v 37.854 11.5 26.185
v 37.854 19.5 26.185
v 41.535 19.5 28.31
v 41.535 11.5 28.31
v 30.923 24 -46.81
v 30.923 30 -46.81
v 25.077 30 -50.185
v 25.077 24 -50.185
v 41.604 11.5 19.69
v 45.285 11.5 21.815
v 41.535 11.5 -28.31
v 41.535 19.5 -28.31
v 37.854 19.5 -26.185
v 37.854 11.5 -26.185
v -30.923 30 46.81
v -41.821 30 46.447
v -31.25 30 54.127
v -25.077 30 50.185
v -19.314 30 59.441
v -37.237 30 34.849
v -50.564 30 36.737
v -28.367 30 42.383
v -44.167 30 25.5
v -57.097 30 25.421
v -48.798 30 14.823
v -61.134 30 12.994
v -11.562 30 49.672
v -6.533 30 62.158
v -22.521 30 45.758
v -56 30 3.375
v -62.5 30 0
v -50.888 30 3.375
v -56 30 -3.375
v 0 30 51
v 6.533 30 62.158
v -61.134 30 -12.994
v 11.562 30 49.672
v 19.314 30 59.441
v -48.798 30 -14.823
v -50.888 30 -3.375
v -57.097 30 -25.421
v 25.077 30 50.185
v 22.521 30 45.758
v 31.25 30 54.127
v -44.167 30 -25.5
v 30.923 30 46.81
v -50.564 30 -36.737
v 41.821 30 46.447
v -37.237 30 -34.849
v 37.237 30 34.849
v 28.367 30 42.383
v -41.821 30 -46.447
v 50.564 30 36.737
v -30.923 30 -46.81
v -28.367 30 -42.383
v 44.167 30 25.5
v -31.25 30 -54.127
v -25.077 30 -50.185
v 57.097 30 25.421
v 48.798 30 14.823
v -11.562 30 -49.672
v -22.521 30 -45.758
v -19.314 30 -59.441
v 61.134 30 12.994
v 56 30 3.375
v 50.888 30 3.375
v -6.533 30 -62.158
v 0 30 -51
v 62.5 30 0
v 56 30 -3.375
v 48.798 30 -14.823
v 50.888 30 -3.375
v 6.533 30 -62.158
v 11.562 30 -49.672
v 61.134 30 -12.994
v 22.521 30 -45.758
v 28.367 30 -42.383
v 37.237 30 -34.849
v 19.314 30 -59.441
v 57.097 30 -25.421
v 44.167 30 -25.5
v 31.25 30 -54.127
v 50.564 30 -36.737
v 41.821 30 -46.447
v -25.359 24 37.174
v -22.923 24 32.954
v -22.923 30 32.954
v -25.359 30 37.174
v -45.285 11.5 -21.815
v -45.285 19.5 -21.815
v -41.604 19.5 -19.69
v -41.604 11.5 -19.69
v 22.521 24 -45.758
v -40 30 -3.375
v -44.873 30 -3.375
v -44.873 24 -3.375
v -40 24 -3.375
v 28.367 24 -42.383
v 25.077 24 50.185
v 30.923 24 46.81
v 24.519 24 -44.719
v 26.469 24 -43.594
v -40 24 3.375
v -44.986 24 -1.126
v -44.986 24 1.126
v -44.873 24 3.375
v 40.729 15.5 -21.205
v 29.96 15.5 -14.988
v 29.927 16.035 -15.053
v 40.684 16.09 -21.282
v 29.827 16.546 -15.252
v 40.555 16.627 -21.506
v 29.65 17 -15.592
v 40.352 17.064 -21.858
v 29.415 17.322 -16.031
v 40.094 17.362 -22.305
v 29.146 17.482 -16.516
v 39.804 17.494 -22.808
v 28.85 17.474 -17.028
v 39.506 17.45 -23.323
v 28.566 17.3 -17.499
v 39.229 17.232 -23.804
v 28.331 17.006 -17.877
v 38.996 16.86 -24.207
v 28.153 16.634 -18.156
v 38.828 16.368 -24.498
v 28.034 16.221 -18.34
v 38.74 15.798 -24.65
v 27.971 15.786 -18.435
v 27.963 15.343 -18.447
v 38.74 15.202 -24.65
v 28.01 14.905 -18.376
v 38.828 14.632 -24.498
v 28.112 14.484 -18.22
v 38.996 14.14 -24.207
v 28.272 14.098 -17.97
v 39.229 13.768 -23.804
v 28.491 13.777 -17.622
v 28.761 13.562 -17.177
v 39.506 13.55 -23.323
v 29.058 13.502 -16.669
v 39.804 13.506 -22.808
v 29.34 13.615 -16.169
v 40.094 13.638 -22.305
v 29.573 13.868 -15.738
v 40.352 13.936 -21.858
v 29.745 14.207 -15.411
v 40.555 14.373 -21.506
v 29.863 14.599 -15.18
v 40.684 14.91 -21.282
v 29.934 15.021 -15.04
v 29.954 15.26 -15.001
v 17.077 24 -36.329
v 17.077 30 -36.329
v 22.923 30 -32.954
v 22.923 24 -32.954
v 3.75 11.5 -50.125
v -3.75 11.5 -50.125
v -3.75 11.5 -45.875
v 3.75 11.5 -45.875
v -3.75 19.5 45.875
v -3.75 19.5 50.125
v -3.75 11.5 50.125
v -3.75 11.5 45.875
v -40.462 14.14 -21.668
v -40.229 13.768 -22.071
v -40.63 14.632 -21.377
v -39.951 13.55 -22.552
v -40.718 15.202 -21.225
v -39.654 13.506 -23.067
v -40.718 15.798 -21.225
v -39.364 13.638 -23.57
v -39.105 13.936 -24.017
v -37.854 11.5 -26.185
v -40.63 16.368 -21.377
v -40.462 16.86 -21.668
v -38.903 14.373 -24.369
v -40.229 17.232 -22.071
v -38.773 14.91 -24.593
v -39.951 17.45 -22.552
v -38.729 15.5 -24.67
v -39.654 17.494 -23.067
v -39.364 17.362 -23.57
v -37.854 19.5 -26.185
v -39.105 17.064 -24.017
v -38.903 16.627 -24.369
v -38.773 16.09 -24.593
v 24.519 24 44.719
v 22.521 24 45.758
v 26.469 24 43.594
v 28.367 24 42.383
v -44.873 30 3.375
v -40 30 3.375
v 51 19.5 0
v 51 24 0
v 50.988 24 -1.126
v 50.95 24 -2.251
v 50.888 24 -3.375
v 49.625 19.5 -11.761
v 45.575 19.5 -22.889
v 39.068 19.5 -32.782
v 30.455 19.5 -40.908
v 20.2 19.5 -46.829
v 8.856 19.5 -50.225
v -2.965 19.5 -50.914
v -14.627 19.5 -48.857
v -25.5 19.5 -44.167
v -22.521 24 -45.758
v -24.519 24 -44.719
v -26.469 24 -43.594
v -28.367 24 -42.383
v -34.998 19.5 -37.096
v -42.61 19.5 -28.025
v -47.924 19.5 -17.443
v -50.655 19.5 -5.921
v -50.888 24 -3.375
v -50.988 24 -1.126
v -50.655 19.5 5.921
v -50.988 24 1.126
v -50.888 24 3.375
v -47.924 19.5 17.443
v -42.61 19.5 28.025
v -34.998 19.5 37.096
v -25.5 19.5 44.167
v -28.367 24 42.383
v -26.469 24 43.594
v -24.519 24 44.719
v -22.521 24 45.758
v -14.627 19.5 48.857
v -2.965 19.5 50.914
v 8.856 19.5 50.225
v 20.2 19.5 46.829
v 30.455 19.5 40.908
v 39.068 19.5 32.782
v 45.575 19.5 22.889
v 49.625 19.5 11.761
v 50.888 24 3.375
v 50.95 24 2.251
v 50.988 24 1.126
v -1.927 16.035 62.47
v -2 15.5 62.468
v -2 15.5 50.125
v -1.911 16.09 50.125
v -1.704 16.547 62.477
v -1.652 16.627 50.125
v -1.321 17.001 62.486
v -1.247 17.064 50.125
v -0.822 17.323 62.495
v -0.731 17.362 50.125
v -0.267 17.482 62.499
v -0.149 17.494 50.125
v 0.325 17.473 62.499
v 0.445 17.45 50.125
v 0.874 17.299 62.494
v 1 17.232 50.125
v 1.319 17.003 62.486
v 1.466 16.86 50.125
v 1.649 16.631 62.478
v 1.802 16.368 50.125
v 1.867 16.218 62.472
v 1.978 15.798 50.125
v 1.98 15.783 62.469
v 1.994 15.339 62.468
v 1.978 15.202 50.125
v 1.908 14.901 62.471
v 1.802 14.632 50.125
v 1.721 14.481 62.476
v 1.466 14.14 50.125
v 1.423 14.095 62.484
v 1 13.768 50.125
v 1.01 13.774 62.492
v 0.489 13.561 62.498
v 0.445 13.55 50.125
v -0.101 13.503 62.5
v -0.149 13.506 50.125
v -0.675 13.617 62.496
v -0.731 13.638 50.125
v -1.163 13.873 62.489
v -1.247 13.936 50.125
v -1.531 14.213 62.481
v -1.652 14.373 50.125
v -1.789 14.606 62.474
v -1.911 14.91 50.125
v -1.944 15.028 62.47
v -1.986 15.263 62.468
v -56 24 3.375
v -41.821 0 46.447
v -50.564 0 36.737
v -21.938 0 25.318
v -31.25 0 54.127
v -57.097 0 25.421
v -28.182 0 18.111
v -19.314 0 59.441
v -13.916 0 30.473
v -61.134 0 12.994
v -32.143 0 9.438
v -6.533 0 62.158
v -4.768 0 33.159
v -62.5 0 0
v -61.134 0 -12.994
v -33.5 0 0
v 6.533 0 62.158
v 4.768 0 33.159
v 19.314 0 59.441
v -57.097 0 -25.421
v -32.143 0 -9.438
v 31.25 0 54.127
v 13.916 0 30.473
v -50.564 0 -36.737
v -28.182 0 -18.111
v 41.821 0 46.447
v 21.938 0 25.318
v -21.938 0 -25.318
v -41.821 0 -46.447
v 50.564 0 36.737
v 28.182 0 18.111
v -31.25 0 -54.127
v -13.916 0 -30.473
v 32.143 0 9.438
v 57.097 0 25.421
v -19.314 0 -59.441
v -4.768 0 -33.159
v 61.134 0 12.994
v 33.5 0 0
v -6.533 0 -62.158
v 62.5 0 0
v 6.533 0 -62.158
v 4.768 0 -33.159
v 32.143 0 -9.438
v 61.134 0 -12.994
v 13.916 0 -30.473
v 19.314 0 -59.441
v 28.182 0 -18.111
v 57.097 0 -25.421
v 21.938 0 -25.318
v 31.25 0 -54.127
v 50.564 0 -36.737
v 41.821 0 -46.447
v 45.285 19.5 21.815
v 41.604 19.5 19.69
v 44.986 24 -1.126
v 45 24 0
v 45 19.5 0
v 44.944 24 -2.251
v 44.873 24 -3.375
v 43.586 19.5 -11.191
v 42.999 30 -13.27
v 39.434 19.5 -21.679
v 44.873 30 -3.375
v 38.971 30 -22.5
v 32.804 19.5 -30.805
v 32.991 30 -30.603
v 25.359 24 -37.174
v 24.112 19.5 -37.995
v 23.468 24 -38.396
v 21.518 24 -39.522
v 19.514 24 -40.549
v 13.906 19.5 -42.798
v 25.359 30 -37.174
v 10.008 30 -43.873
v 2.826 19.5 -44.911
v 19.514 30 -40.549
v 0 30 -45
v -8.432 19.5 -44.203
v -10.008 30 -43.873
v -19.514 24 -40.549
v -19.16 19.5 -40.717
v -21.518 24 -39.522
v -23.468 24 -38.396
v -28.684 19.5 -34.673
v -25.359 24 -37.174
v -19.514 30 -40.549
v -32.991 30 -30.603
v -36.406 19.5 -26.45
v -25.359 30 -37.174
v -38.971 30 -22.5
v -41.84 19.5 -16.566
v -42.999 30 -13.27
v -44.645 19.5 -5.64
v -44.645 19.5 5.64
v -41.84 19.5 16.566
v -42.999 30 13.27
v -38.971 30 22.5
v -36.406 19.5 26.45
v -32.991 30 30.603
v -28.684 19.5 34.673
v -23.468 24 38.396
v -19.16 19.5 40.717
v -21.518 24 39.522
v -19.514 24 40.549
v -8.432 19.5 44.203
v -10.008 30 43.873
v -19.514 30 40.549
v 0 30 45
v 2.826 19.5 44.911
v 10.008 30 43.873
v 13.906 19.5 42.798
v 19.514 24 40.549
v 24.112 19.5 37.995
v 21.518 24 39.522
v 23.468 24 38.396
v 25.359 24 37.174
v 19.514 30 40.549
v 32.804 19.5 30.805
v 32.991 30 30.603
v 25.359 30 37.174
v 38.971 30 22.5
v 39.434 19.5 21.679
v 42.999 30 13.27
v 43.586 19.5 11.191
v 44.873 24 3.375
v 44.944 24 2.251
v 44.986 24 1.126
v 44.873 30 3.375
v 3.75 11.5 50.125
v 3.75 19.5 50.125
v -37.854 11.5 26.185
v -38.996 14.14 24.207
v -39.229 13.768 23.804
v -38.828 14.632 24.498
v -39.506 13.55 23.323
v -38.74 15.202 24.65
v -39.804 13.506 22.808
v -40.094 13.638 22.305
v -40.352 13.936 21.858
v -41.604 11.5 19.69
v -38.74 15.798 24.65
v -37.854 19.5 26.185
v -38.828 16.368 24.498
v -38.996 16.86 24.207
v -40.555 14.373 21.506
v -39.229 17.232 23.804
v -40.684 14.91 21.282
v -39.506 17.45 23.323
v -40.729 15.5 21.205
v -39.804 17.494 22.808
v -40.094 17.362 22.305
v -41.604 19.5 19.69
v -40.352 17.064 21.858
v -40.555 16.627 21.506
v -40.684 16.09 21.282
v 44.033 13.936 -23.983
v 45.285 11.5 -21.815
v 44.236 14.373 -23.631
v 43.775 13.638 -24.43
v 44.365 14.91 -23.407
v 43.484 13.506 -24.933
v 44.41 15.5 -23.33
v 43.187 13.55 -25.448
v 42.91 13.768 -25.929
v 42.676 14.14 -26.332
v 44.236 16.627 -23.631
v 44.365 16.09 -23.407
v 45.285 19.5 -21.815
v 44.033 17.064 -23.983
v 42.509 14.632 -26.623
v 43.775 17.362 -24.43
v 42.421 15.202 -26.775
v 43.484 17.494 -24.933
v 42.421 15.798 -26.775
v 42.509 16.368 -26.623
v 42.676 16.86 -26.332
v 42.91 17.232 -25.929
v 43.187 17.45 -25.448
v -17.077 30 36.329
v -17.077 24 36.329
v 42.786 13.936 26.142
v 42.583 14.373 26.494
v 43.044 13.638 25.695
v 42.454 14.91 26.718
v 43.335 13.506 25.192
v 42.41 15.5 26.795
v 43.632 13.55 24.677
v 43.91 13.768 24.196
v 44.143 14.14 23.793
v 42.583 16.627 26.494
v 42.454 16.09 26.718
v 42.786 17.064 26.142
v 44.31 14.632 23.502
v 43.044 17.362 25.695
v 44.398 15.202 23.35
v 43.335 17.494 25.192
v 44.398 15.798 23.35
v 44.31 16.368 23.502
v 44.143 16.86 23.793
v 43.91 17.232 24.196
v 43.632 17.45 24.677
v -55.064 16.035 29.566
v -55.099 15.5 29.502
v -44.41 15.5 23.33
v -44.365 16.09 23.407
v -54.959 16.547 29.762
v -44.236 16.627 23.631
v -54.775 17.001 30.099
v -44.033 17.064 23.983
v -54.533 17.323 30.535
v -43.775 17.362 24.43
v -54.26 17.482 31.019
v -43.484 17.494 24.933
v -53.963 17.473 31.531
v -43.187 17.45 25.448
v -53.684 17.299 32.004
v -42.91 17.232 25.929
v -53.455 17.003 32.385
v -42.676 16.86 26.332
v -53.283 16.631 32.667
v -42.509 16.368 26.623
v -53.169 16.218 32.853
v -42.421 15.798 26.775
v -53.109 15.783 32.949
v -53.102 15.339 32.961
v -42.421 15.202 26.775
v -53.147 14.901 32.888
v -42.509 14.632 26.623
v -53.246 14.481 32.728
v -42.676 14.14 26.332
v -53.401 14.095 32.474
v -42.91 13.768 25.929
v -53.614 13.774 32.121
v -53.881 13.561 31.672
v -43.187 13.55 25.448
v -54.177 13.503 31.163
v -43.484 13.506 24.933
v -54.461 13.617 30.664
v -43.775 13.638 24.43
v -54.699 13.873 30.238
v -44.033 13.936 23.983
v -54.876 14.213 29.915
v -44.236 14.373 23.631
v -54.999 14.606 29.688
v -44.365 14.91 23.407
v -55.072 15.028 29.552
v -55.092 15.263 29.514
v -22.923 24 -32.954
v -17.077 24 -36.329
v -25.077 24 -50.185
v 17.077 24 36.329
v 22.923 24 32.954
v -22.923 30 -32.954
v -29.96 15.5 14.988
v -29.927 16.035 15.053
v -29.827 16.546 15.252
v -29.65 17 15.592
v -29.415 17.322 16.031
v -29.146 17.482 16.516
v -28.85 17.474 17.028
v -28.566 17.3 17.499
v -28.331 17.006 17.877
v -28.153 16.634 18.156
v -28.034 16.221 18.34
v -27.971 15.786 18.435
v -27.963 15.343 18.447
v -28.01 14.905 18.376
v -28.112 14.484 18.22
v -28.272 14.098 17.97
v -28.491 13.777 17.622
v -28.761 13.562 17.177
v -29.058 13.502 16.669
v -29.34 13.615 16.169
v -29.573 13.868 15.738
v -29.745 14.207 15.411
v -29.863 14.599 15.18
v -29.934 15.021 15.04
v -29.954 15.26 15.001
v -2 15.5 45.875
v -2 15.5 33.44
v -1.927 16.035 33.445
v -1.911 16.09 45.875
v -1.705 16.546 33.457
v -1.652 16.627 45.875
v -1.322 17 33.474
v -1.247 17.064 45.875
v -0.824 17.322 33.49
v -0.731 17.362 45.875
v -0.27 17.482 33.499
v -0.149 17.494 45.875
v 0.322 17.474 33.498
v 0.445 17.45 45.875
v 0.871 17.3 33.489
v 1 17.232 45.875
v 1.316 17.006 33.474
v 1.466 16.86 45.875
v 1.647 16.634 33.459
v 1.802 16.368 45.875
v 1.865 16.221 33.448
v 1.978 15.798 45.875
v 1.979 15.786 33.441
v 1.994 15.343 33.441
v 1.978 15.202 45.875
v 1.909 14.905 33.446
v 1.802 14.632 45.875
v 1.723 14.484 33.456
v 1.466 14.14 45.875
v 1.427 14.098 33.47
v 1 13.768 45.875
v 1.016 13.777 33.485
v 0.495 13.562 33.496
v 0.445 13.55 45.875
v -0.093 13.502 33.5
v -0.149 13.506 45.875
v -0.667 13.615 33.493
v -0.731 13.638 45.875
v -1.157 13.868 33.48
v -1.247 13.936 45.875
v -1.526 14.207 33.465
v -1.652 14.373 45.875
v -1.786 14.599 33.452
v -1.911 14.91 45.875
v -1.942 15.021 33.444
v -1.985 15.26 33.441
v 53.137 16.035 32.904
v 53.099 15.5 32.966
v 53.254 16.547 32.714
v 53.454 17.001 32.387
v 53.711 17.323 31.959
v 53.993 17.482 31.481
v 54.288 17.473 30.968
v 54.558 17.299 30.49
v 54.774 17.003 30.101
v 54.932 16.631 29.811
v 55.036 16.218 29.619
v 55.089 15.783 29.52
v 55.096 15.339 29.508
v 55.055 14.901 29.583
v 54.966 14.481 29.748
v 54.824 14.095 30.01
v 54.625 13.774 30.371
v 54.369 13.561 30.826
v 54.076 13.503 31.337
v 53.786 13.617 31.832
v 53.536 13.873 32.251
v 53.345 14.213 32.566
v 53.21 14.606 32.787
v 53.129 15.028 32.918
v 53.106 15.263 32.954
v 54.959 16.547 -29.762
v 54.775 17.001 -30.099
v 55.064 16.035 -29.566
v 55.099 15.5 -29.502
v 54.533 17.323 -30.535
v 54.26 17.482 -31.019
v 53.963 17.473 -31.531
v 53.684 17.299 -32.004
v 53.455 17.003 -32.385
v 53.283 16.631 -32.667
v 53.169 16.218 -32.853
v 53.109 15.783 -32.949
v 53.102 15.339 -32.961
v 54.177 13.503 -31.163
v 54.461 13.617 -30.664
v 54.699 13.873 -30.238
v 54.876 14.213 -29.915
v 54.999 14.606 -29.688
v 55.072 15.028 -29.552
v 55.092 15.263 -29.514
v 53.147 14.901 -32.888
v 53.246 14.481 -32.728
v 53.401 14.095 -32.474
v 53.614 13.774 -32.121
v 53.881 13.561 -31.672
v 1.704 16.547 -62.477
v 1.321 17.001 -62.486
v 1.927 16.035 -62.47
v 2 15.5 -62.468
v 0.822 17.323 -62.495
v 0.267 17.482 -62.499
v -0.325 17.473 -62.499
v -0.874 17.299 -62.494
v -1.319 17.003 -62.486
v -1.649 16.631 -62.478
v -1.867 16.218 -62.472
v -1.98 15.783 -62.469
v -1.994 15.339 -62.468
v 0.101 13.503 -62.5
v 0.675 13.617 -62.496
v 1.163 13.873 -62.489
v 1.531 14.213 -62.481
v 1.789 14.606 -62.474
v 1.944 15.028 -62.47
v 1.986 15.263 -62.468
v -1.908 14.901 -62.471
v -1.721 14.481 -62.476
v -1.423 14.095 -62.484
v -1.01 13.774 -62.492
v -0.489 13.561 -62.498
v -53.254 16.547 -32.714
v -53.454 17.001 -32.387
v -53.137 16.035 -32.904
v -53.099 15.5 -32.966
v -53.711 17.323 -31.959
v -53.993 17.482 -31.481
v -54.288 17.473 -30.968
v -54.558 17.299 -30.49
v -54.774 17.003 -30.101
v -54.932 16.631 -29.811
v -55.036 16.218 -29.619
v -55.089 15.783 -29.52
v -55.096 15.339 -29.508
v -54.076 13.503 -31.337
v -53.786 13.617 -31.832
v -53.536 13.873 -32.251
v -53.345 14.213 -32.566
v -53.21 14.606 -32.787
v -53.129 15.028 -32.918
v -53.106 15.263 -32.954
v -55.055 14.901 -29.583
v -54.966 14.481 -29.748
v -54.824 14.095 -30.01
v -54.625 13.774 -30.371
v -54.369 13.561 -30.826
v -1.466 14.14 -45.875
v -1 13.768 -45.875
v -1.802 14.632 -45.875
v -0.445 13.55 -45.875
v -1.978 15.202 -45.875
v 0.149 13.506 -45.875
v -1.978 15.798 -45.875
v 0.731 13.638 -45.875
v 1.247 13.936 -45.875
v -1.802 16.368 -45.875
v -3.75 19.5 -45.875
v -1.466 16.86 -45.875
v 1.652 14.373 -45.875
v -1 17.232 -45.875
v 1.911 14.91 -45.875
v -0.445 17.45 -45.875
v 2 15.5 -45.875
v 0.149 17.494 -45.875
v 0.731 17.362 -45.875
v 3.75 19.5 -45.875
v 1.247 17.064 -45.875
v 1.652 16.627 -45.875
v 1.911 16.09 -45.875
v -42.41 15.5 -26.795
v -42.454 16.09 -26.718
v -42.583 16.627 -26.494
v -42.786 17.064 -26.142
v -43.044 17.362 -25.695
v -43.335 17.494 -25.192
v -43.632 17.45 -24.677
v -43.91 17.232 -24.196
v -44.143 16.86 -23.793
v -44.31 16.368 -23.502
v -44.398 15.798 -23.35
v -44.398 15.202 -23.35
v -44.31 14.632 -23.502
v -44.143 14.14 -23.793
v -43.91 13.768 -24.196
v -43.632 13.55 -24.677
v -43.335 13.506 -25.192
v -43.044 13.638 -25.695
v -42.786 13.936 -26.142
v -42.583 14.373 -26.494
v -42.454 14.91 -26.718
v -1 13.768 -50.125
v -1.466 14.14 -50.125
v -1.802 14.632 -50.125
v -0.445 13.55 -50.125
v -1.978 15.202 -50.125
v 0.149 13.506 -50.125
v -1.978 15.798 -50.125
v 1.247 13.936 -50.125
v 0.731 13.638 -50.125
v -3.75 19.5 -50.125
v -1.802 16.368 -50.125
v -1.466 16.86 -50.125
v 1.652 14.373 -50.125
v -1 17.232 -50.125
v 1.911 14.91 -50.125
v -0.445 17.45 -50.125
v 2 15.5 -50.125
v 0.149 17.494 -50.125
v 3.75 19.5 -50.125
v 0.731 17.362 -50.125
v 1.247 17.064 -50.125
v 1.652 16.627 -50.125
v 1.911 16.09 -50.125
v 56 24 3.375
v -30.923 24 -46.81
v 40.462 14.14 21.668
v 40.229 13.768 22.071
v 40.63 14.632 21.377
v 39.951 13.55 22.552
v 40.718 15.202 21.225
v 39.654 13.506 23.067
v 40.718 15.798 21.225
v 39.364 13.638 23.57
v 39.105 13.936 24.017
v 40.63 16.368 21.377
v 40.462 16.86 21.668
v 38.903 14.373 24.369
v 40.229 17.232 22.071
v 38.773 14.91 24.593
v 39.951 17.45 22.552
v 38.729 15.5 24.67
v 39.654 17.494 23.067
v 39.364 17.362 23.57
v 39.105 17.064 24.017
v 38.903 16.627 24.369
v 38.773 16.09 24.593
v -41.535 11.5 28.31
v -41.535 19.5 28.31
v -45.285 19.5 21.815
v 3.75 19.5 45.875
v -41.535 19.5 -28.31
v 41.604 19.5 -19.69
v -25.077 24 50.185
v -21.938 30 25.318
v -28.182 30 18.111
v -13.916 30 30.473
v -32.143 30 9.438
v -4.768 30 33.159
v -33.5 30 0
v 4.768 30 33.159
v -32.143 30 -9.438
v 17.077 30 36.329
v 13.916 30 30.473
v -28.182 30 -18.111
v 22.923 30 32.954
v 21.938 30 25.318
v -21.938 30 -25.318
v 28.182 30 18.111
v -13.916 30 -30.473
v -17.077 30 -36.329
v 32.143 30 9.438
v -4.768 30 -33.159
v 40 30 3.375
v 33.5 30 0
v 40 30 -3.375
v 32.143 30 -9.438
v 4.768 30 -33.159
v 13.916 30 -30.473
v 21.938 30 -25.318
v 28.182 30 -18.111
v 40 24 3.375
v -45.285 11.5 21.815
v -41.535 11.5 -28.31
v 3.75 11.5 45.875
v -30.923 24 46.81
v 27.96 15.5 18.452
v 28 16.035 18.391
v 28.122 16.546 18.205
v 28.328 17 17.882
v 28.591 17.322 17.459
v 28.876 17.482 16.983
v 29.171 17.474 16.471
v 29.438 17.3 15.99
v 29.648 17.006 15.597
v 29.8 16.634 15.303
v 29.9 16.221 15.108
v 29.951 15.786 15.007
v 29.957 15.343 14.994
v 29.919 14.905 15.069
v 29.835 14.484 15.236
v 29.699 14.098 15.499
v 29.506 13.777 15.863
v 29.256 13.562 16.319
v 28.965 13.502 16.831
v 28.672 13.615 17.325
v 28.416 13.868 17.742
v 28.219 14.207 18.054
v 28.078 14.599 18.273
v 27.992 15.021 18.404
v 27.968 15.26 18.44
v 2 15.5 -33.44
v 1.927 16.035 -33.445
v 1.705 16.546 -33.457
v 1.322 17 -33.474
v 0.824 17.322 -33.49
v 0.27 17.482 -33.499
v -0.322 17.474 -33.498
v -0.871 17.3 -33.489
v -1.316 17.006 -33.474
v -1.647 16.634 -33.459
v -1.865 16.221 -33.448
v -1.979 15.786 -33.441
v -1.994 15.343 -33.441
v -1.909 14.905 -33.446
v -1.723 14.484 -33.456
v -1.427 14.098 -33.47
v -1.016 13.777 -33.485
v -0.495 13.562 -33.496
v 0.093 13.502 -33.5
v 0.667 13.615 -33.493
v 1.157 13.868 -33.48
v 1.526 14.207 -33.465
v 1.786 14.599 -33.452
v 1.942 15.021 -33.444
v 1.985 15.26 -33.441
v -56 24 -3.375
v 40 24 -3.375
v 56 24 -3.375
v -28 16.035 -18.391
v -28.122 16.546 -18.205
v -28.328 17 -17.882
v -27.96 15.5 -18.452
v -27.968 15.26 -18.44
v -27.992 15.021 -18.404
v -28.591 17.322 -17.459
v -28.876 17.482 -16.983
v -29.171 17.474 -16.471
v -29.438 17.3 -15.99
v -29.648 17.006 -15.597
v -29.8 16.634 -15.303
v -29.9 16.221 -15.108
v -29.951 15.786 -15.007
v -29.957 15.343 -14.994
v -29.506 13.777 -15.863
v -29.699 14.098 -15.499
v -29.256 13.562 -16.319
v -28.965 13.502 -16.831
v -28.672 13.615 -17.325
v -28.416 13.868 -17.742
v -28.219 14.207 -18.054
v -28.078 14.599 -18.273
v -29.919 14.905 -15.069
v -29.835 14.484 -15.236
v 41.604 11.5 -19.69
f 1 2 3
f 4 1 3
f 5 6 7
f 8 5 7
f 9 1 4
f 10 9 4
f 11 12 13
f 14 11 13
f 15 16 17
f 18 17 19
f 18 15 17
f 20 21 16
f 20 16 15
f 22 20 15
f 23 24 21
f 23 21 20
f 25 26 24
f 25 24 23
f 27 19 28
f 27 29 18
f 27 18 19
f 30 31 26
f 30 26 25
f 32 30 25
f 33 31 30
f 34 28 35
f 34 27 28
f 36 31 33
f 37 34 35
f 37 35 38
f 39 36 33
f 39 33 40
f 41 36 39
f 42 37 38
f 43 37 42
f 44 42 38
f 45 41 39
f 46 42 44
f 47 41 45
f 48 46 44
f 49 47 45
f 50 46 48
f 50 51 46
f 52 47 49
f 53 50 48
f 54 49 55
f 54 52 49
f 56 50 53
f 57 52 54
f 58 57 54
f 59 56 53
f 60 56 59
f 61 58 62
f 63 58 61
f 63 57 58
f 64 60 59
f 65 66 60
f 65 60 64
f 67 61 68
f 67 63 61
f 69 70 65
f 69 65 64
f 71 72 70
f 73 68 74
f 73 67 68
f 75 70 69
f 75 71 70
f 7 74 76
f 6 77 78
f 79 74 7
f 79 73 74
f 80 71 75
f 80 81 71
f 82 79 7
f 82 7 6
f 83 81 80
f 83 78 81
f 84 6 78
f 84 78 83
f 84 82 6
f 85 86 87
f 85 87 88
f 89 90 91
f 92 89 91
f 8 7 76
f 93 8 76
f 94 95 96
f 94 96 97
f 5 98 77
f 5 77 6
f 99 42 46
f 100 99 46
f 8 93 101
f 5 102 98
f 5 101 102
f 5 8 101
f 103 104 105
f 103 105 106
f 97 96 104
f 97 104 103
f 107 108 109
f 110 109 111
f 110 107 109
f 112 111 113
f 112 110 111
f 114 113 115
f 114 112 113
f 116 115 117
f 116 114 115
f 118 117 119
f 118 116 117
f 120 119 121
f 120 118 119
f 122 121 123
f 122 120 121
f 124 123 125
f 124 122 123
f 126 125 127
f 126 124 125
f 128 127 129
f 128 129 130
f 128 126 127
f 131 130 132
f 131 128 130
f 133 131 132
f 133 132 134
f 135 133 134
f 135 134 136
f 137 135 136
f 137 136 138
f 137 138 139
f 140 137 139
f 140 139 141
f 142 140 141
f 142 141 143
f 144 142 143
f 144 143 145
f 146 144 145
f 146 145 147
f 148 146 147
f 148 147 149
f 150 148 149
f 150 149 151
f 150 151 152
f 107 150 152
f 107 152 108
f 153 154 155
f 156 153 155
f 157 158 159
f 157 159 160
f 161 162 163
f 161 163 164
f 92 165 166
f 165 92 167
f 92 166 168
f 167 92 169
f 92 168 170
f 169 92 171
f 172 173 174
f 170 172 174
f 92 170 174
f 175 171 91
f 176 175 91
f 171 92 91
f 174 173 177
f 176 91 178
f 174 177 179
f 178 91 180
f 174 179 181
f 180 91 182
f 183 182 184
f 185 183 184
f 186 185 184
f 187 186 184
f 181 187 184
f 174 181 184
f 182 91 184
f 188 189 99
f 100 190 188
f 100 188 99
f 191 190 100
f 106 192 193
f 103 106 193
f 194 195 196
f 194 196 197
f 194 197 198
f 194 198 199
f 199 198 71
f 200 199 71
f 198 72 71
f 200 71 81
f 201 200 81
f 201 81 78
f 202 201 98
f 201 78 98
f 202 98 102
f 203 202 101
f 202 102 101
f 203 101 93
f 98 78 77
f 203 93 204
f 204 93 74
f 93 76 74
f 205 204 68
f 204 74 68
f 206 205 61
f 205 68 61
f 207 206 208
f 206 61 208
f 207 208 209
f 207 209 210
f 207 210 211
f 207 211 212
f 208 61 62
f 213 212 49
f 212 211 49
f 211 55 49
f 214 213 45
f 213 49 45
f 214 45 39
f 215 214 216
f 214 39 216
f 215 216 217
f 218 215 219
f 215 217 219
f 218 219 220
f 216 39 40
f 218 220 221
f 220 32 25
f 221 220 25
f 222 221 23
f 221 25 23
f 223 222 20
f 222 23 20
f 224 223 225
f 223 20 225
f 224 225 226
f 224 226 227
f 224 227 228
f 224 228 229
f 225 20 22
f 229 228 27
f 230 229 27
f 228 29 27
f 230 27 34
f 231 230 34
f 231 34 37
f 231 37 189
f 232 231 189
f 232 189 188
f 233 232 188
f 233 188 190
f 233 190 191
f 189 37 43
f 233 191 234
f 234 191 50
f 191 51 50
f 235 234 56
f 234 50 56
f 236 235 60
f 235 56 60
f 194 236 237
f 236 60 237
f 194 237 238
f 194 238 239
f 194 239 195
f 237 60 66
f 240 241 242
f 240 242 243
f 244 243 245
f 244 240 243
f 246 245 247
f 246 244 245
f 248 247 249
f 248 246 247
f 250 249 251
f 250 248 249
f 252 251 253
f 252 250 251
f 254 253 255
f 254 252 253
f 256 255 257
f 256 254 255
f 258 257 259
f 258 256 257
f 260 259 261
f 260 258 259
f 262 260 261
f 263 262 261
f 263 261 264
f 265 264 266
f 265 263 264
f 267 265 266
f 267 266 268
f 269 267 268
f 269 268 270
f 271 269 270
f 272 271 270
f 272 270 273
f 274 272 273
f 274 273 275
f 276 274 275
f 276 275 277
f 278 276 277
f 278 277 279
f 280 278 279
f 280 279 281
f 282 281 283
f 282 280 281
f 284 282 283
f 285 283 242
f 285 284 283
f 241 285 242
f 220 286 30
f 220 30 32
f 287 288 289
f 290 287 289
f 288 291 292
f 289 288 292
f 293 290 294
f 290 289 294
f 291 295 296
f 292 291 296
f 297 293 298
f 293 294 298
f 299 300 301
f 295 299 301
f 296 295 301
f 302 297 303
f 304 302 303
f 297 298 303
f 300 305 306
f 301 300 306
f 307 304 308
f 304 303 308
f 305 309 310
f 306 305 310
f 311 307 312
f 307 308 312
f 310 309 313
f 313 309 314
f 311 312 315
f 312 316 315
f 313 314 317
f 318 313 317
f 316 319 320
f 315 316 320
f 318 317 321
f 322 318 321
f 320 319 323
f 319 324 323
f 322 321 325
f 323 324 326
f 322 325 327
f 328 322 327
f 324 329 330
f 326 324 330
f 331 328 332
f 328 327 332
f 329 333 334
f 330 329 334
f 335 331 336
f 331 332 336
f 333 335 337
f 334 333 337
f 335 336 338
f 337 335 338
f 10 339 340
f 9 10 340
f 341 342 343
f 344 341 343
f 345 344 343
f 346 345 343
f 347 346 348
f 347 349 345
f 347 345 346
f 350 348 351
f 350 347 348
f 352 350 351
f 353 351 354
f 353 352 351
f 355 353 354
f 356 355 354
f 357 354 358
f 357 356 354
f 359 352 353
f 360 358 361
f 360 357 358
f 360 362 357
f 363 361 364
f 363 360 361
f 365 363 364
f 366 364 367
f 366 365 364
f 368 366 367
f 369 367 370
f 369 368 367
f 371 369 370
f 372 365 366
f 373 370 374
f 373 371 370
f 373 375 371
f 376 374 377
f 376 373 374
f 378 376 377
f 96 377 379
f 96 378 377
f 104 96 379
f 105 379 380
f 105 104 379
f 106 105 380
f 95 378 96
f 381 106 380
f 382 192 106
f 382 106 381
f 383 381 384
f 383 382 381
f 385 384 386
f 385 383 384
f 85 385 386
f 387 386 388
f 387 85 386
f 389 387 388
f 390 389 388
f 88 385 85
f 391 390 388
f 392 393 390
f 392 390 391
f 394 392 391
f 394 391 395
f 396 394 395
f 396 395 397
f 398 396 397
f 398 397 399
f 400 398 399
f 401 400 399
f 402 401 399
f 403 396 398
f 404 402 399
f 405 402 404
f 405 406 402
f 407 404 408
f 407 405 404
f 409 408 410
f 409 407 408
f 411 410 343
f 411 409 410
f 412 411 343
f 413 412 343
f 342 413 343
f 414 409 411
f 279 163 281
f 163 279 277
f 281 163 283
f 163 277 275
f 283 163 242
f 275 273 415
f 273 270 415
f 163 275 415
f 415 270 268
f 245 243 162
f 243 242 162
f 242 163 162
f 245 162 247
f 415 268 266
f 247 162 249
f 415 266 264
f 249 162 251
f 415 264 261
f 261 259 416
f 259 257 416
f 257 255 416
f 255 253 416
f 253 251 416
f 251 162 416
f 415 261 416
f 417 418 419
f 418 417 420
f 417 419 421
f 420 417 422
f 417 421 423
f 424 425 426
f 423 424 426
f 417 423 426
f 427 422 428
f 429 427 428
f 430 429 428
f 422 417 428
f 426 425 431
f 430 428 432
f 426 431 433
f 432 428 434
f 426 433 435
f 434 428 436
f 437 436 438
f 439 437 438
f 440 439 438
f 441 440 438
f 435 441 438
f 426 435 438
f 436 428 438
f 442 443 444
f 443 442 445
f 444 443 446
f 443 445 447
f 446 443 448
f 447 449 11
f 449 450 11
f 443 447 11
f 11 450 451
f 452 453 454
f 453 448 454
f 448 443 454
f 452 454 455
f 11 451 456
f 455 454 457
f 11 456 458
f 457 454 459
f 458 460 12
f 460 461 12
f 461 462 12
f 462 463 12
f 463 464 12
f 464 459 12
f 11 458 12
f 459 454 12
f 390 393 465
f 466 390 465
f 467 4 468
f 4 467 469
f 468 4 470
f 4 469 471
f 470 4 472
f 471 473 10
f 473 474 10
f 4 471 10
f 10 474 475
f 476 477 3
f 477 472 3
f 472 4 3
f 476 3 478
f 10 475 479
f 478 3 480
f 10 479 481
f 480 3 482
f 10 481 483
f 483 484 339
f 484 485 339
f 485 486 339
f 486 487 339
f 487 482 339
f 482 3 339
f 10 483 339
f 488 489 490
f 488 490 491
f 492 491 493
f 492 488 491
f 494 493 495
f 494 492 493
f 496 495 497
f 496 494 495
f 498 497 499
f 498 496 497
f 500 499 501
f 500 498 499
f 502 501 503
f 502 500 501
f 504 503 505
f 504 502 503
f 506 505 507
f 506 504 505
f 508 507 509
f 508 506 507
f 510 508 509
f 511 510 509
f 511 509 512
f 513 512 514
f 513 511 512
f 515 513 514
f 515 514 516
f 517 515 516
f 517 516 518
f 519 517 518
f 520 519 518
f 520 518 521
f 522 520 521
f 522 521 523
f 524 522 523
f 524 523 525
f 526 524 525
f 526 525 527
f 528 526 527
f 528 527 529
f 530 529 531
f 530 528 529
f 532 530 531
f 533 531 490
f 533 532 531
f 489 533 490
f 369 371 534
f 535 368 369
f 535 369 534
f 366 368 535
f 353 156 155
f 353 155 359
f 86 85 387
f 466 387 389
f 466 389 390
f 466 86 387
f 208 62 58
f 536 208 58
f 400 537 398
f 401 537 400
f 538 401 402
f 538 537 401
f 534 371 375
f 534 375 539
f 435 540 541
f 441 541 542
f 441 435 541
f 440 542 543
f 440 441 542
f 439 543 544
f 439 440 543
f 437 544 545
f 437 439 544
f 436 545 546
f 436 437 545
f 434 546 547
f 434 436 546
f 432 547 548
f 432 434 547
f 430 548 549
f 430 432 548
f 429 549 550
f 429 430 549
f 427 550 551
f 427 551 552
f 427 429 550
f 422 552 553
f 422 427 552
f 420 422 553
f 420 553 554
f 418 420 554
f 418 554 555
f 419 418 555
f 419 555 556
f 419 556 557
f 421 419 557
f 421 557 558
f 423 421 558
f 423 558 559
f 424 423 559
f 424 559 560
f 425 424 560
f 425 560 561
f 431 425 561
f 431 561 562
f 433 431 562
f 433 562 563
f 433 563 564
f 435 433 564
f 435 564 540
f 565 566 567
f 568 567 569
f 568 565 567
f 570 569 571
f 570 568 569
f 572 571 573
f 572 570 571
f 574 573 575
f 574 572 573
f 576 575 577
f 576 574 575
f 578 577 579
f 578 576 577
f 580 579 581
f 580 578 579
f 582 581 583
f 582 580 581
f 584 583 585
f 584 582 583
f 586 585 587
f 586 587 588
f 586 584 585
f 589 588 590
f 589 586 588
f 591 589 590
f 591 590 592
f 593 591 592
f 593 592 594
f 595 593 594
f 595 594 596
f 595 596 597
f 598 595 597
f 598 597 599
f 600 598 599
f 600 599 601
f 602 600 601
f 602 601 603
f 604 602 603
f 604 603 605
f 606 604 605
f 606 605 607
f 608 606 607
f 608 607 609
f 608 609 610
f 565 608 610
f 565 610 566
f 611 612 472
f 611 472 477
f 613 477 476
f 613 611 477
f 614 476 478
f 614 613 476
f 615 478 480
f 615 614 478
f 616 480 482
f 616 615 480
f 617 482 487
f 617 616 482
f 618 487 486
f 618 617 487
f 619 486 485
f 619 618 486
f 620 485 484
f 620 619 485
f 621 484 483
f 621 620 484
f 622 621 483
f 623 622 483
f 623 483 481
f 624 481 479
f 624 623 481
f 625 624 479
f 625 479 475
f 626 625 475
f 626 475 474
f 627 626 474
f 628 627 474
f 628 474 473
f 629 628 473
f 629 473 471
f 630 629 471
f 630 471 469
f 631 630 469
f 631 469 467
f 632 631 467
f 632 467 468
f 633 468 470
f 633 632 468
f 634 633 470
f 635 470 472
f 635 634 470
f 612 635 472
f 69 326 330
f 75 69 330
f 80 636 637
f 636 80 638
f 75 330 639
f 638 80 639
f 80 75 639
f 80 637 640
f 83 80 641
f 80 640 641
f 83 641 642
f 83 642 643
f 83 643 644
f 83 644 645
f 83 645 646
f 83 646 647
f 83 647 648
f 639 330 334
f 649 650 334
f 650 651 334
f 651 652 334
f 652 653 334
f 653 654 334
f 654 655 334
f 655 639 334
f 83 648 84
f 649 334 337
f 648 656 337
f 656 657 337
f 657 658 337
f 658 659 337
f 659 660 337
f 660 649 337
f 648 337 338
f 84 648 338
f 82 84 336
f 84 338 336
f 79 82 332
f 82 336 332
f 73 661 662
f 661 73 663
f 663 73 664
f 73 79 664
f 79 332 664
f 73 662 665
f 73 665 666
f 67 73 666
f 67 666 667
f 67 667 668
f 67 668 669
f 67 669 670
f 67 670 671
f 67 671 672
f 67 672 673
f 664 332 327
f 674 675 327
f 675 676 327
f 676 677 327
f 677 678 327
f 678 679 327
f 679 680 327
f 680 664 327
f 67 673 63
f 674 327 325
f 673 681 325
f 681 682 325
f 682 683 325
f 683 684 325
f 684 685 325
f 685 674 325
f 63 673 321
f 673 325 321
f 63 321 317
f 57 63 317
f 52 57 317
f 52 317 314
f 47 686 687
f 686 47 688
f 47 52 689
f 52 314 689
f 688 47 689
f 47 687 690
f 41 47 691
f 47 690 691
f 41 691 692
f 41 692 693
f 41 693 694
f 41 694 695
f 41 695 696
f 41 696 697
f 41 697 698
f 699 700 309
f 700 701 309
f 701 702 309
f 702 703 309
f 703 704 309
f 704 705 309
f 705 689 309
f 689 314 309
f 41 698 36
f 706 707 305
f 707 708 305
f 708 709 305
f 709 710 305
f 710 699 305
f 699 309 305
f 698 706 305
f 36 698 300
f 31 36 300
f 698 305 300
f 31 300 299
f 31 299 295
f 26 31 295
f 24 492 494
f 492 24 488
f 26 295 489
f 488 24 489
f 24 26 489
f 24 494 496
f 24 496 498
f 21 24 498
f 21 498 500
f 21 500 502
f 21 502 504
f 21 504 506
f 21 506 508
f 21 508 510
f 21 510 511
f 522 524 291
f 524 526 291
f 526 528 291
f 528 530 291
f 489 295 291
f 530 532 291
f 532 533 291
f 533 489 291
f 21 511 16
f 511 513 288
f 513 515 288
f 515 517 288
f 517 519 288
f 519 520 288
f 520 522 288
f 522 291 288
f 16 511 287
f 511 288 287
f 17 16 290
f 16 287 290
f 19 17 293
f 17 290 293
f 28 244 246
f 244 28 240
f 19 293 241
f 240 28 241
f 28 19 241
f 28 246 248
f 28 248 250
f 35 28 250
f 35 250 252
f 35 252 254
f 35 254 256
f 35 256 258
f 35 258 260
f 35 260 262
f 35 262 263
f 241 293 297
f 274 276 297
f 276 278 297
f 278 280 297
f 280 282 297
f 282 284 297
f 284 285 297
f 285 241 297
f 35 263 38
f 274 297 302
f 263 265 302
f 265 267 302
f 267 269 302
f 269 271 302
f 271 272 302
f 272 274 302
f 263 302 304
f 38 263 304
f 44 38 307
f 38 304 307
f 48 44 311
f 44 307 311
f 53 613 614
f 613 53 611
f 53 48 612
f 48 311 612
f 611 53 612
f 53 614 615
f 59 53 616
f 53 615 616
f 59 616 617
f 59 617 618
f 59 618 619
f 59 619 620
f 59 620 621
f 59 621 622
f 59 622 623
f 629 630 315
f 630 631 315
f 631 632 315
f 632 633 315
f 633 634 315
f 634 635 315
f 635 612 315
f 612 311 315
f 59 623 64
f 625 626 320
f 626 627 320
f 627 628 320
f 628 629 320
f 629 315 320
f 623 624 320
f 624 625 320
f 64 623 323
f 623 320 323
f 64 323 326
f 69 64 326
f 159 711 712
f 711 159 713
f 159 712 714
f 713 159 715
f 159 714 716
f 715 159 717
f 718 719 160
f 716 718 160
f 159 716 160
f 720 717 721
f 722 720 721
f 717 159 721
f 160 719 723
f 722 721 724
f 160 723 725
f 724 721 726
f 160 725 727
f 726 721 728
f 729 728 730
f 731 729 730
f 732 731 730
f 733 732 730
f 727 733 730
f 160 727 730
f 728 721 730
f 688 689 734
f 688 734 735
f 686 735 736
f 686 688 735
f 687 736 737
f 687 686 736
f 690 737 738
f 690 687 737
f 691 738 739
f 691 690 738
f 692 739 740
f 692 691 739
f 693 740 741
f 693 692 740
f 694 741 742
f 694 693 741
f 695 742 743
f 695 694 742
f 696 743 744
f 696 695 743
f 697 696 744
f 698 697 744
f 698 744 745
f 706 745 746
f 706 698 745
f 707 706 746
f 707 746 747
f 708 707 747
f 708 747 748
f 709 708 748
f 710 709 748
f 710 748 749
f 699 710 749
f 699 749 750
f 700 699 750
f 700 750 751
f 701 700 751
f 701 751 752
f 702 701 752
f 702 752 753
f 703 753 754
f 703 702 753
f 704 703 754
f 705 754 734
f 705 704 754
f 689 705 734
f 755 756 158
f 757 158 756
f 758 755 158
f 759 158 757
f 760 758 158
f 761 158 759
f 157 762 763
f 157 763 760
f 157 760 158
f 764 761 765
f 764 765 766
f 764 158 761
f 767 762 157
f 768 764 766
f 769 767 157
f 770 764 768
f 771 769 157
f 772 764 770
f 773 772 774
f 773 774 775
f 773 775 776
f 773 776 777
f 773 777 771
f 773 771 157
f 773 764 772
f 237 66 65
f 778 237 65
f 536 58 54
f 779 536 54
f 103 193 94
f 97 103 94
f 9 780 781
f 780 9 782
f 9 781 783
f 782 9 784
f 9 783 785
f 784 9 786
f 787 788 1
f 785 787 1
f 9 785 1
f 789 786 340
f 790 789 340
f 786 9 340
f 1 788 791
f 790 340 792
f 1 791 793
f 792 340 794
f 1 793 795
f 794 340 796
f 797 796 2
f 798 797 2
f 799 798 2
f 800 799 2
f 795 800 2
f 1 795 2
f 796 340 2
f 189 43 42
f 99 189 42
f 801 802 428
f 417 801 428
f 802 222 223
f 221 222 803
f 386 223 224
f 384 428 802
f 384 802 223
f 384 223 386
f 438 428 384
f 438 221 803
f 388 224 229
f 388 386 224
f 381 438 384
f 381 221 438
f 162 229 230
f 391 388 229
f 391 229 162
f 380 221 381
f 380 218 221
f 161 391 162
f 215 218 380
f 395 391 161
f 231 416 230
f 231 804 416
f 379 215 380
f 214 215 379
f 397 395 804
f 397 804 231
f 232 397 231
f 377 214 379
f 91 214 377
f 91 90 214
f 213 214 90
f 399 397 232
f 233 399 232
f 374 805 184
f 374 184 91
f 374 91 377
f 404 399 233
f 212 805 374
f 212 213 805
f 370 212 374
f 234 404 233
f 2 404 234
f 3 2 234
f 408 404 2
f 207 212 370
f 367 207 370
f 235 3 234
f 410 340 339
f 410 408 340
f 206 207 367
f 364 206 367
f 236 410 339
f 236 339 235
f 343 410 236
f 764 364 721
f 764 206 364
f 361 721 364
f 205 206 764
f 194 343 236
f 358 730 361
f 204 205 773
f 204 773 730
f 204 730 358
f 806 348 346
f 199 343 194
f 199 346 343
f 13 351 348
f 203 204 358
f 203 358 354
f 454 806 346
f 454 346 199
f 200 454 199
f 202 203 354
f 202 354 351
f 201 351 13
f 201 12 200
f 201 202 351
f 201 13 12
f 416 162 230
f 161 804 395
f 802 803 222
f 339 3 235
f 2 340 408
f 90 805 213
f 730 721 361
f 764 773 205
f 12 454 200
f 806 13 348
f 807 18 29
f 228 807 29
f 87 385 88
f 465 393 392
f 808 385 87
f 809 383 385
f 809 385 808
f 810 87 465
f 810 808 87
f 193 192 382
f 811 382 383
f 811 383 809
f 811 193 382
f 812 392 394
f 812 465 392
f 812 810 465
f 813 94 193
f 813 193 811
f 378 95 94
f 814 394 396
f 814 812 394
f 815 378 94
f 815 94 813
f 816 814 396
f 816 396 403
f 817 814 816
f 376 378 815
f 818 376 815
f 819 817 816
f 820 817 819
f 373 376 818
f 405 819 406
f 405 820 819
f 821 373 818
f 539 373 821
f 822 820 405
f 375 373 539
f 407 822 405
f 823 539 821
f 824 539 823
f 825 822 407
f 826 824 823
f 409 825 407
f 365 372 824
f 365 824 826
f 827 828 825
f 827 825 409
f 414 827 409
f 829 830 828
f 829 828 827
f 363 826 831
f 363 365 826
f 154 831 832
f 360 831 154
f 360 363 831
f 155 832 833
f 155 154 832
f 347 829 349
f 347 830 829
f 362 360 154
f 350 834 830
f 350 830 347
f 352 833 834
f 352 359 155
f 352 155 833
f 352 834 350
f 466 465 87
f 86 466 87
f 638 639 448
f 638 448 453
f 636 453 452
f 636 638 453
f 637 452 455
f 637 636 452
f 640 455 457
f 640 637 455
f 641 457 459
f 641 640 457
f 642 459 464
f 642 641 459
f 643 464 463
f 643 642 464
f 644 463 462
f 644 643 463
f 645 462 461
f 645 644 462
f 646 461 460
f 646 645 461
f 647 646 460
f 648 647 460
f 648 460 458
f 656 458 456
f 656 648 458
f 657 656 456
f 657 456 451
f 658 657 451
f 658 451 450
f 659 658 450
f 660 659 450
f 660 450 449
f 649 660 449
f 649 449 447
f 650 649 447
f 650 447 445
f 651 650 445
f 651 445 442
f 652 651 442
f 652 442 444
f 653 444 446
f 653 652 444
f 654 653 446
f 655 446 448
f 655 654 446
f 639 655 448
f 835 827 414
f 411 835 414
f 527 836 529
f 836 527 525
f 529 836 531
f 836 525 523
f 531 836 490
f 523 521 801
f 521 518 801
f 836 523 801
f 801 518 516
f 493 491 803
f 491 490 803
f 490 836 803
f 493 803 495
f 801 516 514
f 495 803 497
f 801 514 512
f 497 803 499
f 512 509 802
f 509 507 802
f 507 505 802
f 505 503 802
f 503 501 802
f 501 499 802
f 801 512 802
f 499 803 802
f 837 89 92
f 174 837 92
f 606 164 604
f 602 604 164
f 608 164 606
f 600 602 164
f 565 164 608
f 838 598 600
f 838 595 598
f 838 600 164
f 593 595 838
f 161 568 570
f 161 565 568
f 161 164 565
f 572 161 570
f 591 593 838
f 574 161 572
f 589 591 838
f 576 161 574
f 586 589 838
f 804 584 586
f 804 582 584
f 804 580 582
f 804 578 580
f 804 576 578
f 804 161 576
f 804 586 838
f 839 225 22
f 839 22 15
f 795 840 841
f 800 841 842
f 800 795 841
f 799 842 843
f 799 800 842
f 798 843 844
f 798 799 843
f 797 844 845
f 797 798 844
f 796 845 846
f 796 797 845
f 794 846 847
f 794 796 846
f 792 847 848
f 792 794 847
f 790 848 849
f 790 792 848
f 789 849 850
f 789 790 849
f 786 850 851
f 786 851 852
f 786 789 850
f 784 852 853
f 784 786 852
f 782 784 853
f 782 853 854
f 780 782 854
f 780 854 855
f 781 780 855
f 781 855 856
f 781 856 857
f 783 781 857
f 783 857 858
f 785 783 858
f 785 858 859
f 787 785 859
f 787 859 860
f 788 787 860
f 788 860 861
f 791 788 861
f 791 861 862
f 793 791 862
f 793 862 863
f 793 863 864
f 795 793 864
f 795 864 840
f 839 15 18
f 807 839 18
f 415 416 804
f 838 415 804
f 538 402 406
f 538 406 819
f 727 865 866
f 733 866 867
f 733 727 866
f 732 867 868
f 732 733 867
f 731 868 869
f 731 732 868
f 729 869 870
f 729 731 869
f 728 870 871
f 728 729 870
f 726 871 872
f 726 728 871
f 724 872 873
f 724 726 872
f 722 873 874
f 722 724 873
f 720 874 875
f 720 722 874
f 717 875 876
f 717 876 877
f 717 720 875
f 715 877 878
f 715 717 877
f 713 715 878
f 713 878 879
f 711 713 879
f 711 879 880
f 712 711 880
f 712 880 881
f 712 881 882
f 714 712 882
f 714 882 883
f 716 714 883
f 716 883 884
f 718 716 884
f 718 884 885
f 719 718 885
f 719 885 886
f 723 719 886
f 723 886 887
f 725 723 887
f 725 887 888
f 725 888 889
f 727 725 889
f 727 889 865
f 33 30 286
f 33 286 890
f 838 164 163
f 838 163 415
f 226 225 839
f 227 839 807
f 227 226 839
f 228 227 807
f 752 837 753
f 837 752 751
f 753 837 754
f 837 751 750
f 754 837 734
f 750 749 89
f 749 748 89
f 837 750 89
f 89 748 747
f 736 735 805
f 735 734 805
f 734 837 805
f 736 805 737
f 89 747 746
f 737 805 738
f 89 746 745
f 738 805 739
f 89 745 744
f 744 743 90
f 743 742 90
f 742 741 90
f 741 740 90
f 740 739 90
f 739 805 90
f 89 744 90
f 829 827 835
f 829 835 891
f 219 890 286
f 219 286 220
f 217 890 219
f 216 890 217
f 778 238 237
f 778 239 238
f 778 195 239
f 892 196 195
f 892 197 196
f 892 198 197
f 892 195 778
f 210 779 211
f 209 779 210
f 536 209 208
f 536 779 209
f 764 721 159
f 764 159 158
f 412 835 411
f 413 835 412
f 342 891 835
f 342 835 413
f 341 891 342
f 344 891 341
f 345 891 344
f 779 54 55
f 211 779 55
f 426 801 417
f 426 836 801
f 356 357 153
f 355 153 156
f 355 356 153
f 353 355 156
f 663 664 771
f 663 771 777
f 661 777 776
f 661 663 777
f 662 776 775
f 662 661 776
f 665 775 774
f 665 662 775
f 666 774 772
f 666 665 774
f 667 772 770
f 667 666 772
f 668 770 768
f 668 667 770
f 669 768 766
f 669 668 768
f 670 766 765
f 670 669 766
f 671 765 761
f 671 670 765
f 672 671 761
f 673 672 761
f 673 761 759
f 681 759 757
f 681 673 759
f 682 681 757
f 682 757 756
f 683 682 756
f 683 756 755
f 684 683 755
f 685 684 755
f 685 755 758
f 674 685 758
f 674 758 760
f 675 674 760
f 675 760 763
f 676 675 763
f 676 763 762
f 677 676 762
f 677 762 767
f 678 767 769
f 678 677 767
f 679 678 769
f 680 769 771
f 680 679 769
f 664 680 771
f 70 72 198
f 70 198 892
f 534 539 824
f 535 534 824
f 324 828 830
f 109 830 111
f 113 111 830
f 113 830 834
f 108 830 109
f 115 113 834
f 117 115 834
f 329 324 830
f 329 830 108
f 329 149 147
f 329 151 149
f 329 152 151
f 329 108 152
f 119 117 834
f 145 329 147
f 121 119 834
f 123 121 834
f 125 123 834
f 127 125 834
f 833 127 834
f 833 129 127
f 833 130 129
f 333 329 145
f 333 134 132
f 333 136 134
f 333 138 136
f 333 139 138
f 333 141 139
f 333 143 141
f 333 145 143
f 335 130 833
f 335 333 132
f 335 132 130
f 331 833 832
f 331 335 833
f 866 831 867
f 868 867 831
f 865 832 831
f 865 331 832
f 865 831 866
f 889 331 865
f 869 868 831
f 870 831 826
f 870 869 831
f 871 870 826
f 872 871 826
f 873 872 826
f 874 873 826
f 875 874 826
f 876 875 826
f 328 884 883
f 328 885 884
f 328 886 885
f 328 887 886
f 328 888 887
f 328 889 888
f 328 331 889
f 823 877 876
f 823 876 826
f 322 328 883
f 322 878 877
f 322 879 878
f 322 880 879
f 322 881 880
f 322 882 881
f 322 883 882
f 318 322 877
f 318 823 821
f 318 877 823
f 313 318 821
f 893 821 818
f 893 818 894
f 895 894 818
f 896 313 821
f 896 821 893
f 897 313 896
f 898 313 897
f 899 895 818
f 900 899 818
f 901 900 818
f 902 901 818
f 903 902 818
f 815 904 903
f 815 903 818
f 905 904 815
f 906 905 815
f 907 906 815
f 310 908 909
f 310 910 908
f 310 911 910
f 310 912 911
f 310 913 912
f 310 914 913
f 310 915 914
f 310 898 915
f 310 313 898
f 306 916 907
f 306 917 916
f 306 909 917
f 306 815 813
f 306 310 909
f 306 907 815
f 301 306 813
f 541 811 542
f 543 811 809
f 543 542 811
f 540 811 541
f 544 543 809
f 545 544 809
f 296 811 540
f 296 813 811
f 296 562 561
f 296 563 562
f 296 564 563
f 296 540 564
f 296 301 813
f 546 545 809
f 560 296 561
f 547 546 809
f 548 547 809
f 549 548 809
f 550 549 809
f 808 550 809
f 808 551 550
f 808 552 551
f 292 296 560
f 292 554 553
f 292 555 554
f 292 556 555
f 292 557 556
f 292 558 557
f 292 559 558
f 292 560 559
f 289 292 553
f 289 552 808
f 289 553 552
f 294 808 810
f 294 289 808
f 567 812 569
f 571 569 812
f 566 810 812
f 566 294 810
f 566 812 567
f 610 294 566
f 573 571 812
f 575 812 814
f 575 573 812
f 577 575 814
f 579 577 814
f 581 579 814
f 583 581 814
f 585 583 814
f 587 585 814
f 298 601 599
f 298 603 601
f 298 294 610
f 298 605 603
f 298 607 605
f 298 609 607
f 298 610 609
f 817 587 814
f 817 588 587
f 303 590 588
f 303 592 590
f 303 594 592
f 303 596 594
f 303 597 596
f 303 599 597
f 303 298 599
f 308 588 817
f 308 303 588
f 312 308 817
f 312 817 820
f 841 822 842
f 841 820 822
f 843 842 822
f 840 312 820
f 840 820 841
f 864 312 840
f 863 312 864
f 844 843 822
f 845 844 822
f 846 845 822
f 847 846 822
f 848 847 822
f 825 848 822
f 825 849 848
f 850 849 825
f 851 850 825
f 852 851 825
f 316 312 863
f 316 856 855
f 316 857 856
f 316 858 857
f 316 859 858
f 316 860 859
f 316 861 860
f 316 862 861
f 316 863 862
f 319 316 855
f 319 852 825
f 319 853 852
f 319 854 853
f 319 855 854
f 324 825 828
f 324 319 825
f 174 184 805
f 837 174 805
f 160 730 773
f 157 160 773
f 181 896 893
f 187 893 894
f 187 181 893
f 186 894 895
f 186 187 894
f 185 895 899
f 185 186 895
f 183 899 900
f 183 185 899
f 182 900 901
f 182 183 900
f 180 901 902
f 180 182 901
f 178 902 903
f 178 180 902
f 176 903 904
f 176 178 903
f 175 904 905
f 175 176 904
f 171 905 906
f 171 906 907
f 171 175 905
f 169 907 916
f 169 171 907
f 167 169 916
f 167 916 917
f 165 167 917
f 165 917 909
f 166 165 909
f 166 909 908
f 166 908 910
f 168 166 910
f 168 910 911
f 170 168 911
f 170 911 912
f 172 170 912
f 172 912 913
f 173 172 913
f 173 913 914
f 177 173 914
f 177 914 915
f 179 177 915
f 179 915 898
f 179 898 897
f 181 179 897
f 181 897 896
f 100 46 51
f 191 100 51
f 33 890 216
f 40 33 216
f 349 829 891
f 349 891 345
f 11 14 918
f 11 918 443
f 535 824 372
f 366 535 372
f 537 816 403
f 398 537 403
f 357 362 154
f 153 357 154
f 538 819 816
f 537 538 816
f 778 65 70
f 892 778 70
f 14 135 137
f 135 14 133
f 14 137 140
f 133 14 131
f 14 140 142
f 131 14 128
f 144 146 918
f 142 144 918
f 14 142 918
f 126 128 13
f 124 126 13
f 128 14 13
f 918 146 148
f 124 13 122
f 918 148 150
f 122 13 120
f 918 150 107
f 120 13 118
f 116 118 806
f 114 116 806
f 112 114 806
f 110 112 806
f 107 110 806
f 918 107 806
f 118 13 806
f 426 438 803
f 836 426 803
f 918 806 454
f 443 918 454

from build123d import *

# Parameters (mm, degrees)
SKETCH1_R           = 62.5
SKETCH1_R_2         = 33.5
BOSS_EXTRUDE1_DEPTH = 30
SKETCH2_W           = 16
SKETCH2_H           = 6.75
CUT_EXTRUDE2_DEPTH  = 6
SKETCH3_R           = 51
SKETCH3_R_2         = 45
CUT_EXTRUDE3_DEPTH  = 10.5
SKETCH6_W           = 7.5
SKETCH6_H           = 4.25
CUT_EXTRUDE4_DEPTH  = 8
CUT_EXTRUDE5_START  = -13.375
SKETCH8_R           = 2
CUT_EXTRUDE5_DEPTH  = 60.125
CIRPATTERN1_COUNT   = 6


with BuildPart() as part:
    # Sketch1 → Boss-Extrude1 (new body)
    with BuildSketch(Plane(origin=(0, 0, 0), x_dir=(1, 0, 0), z_dir=(0, 1, 0))):
        Circle(SKETCH1_R)
        Circle(SKETCH1_R_2, mode=Mode.SUBTRACT)
    extrude(amount=BOSS_EXTRUDE1_DEPTH)

    # Sketch2 → Cut-Extrude2 (cut)
    with BuildSketch(Plane(origin=(0, 30, 0), x_dir=(1, 0, 0), z_dir=(0, 1, 0))):
        with Locations((48, 0)):
            Rectangle(SKETCH2_W, SKETCH2_H)
        Polygon((22.922835738, -32.953516151), (17.077164262, -36.328516151), (25.077164262, -50.184922612), (30.922835738, -46.809922612), align=None)
        Polygon((-17.077164262, -36.328516151), (-22.922835738, -32.953516151), (-30.922835738, -46.809922612), (-25.077164262, -50.184922612), align=None)
        with Locations((-48, 0)):
            Rectangle(SKETCH2_W, SKETCH2_H)
        Polygon((-22.922835738, 32.953516151), (-17.077164262, 36.328516151), (-25.077164262, 50.184922612), (-30.922835738, 46.809922612), align=None)
        Polygon((17.077164262, 36.328516151), (22.922835738, 32.953516151), (30.922835738, 46.809922612), (25.077164262, 50.184922612), align=None)
    extrude(amount=-CUT_EXTRUDE2_DEPTH, mode=Mode.SUBTRACT)

    # Sketch3 → Cut-Extrude3 (cut)
    with BuildSketch(Plane(origin=(0, 30, 0), x_dir=(1, 0, 0), z_dir=(0, 1, 0))):
        Circle(SKETCH3_R)
        Circle(SKETCH3_R_2, mode=Mode.SUBTRACT)
    extrude(amount=-CUT_EXTRUDE3_DEPTH, mode=Mode.SUBTRACT)

    # Sketch6 → Cut-Extrude4 (cut)
    with BuildSketch(Plane(origin=(0, 19.5, 0), x_dir=(1, 0, 0), z_dir=(0, 1, 0))):
        with Locations((0, 48)):
            Rectangle(SKETCH6_W, SKETCH6_H)
        Polygon((41.534523365, 28.310095264), (37.853915399, 26.185095264), (41.603915399, 19.689904736), (45.284523365, 21.814904736), align=None)
        Polygon((45.284523365, -21.814904736), (41.603915399, -19.689904736), (37.853915399, -26.185095264), (41.534523365, -28.310095264), align=None)
        with Locations((0, -48)):
            Rectangle(SKETCH6_W, SKETCH6_H)
        Polygon((-41.534523365, -28.310095264), (-37.853915399, -26.185095264), (-41.603915399, -19.689904736), (-45.284523365, -21.814904736), align=None)
        Polygon((-45.284523365, 21.814904736), (-41.603915399, 19.689904736), (-37.853915399, 26.185095264), (-41.534523365, 28.310095264), align=None)
    extrude(amount=-CUT_EXTRUDE4_DEPTH, mode=Mode.SUBTRACT)

    # Sketch8 → Cut-Extrude5 (cut)
    with BuildSketch(Plane.XY.offset(-50.125).offset(CUT_EXTRUDE5_START)):
        with Locations((0, 15.5)):
            Circle(SKETCH8_R)
    cut_extrude5 = extrude(amount=CUT_EXTRUDE5_DEPTH, mode=Mode.SUBTRACT)

    # CirPattern1: Cut-Extrude5 ×6 about axis
    cirpattern1_axis = Axis((0, 19.5, 0), (0, 1, 0))
    for i in range(1, CIRPATTERN1_COUNT):
        add(cut_extrude5.rotate(cirpattern1_axis, i * 360 / CIRPATTERN1_COUNT), mode=Mode.SUBTRACT)


solid = part.part
